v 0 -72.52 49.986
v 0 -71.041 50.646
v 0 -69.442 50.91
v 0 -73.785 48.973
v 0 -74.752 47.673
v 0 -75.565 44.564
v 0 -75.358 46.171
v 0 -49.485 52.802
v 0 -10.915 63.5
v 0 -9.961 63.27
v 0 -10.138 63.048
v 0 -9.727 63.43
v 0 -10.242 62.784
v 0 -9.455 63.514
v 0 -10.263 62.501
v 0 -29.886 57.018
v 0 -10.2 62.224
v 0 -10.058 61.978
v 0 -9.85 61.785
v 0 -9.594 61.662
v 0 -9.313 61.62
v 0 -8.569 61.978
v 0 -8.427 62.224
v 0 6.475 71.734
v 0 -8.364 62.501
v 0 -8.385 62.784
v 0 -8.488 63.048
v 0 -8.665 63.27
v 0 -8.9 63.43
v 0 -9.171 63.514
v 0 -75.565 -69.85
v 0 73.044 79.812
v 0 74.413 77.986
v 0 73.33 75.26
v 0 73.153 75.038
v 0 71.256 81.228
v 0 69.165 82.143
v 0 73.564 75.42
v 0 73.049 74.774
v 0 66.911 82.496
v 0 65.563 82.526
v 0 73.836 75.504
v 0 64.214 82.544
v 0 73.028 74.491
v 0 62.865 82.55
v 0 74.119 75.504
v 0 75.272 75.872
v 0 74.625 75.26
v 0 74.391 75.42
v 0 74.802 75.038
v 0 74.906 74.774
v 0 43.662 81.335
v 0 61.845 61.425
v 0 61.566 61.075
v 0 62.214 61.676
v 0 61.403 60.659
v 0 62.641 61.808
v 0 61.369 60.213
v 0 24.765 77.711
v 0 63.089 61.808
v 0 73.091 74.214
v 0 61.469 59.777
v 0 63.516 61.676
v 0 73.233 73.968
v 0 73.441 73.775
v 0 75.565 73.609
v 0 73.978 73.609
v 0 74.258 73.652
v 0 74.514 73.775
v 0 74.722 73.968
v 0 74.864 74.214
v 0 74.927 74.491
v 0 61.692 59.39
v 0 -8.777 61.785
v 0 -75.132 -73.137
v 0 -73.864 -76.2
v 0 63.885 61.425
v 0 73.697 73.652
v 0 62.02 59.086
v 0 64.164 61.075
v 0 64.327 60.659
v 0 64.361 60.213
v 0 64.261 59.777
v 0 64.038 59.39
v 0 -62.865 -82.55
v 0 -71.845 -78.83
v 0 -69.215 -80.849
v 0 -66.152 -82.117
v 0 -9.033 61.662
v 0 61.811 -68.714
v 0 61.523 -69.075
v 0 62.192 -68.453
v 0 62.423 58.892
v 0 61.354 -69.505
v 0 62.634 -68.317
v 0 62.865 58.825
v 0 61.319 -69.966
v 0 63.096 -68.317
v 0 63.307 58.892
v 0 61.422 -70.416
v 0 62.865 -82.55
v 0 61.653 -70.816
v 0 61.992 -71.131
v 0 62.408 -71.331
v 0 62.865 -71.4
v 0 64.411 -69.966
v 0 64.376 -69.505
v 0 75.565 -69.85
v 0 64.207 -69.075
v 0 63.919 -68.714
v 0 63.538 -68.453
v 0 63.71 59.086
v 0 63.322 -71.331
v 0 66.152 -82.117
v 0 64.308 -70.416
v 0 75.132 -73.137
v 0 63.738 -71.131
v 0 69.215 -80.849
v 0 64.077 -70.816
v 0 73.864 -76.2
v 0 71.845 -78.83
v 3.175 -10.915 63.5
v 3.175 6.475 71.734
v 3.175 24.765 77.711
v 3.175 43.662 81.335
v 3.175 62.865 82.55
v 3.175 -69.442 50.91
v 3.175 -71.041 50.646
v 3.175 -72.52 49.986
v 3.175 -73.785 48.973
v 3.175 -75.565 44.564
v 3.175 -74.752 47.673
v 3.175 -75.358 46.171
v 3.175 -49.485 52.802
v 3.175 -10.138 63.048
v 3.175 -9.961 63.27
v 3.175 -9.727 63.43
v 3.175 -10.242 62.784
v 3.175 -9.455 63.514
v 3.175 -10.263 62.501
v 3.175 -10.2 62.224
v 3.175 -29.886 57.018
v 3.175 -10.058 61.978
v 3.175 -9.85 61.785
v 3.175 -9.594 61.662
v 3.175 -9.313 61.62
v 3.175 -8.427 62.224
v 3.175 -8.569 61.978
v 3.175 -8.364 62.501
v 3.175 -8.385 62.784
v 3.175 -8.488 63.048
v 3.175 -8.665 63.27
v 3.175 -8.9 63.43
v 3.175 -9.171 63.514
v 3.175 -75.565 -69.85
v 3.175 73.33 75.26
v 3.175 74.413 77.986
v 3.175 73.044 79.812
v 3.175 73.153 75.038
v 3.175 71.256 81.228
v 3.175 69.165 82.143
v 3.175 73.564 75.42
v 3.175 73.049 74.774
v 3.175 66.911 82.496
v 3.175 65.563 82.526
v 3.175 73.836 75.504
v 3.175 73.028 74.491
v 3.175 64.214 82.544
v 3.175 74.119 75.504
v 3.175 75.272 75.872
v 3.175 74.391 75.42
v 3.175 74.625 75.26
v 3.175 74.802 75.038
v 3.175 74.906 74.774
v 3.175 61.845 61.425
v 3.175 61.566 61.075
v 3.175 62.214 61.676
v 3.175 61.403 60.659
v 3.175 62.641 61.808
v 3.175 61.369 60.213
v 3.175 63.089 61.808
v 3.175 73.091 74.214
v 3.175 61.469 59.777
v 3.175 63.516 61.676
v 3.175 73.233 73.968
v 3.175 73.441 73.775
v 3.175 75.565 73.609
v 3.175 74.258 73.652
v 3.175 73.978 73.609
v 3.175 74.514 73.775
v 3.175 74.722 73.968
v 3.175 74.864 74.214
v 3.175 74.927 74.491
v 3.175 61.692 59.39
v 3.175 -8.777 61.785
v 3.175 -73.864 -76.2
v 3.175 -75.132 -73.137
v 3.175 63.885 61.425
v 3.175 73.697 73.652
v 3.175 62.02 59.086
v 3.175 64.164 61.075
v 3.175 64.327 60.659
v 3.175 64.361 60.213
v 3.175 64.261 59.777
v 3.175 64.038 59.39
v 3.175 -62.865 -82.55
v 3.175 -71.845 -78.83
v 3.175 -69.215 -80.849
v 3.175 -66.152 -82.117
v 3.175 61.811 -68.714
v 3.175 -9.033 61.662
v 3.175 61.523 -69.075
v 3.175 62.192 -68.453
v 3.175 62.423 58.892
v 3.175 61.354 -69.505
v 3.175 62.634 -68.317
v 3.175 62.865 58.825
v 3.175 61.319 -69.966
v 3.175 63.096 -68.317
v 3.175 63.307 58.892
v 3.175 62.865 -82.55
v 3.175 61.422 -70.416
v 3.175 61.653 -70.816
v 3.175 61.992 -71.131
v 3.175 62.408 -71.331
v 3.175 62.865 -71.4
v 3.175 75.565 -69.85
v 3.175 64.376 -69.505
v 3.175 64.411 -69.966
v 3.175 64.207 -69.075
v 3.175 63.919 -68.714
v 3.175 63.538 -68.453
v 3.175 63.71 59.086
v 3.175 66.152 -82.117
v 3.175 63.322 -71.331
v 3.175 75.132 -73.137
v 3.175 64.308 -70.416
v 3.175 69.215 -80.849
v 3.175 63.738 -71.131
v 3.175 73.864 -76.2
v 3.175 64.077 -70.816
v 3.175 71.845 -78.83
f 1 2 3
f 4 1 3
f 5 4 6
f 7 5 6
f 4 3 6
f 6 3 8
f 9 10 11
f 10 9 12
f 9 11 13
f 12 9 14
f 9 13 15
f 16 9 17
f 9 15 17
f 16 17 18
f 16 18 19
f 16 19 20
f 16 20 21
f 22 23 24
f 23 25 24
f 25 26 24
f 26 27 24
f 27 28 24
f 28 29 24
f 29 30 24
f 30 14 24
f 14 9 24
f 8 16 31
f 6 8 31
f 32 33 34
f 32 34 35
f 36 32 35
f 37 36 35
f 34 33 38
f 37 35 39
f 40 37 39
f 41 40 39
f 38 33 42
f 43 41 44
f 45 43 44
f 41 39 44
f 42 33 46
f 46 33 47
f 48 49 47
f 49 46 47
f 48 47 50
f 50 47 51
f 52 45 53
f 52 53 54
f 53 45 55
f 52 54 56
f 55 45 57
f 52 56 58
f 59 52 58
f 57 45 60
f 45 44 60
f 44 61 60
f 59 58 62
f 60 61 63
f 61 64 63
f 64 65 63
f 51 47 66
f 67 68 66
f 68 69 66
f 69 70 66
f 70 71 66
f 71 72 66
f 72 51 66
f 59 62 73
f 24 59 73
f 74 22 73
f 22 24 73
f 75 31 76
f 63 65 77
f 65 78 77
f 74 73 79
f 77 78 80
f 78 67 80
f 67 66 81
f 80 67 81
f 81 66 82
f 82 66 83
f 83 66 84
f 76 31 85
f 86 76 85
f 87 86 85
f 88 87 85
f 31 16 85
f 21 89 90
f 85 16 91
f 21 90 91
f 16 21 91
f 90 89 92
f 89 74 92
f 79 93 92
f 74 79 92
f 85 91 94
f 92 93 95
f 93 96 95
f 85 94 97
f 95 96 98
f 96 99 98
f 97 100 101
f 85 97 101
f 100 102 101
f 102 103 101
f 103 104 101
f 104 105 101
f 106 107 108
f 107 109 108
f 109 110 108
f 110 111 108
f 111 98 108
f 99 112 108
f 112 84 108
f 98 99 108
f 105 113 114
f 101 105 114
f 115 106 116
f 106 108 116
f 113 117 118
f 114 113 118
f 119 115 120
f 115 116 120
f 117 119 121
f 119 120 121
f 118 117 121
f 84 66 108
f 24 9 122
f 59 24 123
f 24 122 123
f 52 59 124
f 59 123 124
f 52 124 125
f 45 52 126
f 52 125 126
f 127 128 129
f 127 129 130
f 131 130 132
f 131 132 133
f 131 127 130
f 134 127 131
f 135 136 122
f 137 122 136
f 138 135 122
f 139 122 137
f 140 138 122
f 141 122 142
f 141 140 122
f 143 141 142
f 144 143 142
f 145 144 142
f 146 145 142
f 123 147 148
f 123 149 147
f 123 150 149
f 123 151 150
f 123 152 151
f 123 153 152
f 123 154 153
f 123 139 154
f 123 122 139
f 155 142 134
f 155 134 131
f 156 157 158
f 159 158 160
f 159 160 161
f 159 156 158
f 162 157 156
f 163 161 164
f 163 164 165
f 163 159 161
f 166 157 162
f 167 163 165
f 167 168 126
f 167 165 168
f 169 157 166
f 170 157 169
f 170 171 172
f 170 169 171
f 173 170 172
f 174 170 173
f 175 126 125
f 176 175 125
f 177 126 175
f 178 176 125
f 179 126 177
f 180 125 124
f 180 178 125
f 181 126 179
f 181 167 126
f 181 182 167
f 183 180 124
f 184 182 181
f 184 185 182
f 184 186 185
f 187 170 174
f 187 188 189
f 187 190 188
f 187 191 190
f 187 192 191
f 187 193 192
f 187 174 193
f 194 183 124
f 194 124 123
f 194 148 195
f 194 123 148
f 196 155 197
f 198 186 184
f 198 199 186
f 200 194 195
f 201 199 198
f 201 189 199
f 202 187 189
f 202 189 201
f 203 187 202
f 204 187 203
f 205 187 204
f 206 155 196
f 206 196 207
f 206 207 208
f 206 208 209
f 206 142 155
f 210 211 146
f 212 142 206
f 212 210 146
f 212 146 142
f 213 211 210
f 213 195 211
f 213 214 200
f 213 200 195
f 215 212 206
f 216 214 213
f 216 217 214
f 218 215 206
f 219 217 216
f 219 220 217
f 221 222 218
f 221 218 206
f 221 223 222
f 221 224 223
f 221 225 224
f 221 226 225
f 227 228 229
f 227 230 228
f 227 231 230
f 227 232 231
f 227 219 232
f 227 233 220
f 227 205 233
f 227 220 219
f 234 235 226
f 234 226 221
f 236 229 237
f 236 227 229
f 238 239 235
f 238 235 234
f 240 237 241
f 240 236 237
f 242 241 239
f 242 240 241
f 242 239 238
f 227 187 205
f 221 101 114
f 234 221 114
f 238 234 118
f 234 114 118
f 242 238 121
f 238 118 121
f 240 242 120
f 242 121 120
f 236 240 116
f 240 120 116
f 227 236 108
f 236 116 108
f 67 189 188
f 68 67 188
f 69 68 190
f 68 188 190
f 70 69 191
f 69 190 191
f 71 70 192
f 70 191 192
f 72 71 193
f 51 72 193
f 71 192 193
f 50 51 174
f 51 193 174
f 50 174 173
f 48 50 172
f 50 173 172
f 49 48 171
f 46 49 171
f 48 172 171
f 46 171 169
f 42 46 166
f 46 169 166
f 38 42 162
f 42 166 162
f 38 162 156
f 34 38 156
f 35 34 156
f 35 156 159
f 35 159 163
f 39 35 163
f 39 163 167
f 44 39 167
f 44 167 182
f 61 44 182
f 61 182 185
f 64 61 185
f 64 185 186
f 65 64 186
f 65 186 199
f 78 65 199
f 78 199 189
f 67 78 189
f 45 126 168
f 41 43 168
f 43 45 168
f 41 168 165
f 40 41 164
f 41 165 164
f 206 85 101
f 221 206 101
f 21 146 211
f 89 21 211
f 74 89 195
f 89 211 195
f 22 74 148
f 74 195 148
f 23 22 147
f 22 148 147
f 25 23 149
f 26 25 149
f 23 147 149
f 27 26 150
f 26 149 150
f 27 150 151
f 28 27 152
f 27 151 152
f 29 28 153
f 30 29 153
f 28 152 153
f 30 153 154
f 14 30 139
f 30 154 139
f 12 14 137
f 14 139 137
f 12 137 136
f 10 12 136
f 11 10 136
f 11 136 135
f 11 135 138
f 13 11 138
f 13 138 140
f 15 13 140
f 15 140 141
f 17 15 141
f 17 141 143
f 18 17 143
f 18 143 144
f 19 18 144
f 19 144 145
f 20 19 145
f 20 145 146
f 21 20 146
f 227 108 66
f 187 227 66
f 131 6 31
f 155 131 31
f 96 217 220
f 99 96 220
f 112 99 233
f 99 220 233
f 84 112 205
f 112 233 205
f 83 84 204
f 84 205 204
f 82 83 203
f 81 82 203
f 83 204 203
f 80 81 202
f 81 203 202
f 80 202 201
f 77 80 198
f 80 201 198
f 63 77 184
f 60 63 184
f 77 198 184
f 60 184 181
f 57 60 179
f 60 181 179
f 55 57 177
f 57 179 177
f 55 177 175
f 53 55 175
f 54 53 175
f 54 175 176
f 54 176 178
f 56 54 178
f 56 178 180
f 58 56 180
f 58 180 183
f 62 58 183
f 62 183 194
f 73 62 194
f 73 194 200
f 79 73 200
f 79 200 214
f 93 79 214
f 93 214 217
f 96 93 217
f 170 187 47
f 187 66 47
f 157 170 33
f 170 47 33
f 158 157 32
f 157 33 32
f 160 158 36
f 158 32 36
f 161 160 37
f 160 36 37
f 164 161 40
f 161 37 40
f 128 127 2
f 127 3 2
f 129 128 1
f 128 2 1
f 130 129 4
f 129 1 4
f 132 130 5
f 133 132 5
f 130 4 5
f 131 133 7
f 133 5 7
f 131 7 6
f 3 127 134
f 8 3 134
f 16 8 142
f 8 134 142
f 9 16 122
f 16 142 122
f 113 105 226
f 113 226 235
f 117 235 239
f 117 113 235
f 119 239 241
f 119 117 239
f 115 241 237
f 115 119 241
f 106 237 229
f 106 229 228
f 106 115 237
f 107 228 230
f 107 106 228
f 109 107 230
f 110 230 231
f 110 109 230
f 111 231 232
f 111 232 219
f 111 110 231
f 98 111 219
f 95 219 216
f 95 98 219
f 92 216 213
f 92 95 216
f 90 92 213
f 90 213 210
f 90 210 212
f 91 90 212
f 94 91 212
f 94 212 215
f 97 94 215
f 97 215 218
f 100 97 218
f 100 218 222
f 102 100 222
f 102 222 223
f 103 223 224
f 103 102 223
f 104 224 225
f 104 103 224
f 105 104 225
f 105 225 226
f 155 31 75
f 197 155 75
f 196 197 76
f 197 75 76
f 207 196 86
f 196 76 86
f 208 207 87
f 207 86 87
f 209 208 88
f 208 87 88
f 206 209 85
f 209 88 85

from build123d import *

# Parameters (mm, degrees)
SKETCH1_R           = 1.55
BOSS_EXTRUDE1_DEPTH = 3.175
CUT_EXTRUDE1_DEPTH  = 4.175
FILLET1_R           = 8.89
SKETCH3_R           = 1.5
CUT_EXTRUDE2_DEPTH  = 4.175
SKETCH4_R           = 0.9525
CUT_EXTRUDE3_DEPTH  = 4.175
FILLET2_R           = 6.35


with BuildPart() as part:
    # Sketch1 → Boss-Extrude1 (new body)
    with BuildSketch(Plane(origin=(0, 0, 0), x_dir=(0, 0, -1), z_dir=(1, 0, 0))):
        with BuildLine():
            Line((69.85, 75.565), (-82.55, 75.565))
            Line((-82.55, 75.565), (-82.55, -75.565))
            Line((-82.55, -75.565), (69.85, -75.565))
            ThreePointArc((69.85, -75.565), (78.830256121, -71.845256121), (82.55, -62.865))
            Line((82.55, -62.865), (82.55, 62.865))
            ThreePointArc((82.55, 62.865), (78.830256121, 71.845256121), (69.85, 75.565))
        make_face()
        with Locations((69.85, 62.865)):
            Circle(SKETCH1_R, mode=Mode.SUBTRACT)
    extrude(amount=BOSS_EXTRUDE1_DEPTH)

    # Sketch2 → Cut-Extrude1 (cut, through all)
    with BuildSketch(Plane(origin=(3.175, 0, 0), x_dir=(0, 0, -1), z_dir=(1, 0, 0))):
        with BuildLine():
            Line((-63.5, -10.915332745), (-63.5, -75.565))
            Line((-63.5, -75.565), (-50.8, -75.565))
            ThreePointArc((-50.8, -75.565), (-54.005053677, -42.622362446), (-63.5, -10.915332745))
        make_face()
        with BuildLine():
            Line((-82.55, 75.565), (-82.55, 62.865))
            ThreePointArc((-82.55, 62.865), (-82.417420191, 69.220528969), (-82.019911437, 75.565))
            Line((-82.019911437, 75.565), (-82.55, 75.565))
        make_face()
        with BuildLine():
            Line((-82.55, -75.565), (-63.5, -75.565))
            Line((-63.5, -75.565), (-63.5, -10.915332745))
            ThreePointArc((-63.5, -10.915332745), (-77.710665491, 24.765), (-82.55, 62.865))
            Line((-82.55, 62.865), (-82.55, -75.565))
        make_face()
    extrude(amount=-CUT_EXTRUDE1_DEPTH, mode=Mode.SUBTRACT)

    # Fillet1
    fillet1_edges = [part.edges().sort_by_distance(p)[0] for p in [
        (1.5875, 75.565, 82.019911437),
    ]]
    fillet(fillet1_edges, radius=FILLET1_R)

    # Sketch3 → Cut-Extrude2 (cut, through all)
    with BuildSketch(Plane(origin=(3.175, 0, 0), x_dir=(0, 0, -1), z_dir=(1, 0, 0))):
        with Locations((-60.325, 62.865)):
            Circle(SKETCH3_R)
    extrude(amount=-CUT_EXTRUDE2_DEPTH, mode=Mode.SUBTRACT)

    # Sketch4 → Cut-Extrude3 (cut, through all)
    with BuildSketch(Plane(origin=(3.175, 0, 0), x_dir=(0, 0, -1), z_dir=(1, 0, 0))):
        with Locations((-74.561915864, 73.9775)):
            Circle(SKETCH4_R)
        with Locations((-62.57206458, -9.313350112)):
            Circle(SKETCH4_R)
    extrude(amount=-CUT_EXTRUDE3_DEPTH, mode=Mode.SUBTRACT)

    # Fillet2
    fillet2_edges = [part.edges().sort_by_distance(p)[0] for p in [
        (1.5875, -75.565, 50.8),
    ]]
    fillet(fillet2_edges, radius=FILLET2_R)


solid = part.part
